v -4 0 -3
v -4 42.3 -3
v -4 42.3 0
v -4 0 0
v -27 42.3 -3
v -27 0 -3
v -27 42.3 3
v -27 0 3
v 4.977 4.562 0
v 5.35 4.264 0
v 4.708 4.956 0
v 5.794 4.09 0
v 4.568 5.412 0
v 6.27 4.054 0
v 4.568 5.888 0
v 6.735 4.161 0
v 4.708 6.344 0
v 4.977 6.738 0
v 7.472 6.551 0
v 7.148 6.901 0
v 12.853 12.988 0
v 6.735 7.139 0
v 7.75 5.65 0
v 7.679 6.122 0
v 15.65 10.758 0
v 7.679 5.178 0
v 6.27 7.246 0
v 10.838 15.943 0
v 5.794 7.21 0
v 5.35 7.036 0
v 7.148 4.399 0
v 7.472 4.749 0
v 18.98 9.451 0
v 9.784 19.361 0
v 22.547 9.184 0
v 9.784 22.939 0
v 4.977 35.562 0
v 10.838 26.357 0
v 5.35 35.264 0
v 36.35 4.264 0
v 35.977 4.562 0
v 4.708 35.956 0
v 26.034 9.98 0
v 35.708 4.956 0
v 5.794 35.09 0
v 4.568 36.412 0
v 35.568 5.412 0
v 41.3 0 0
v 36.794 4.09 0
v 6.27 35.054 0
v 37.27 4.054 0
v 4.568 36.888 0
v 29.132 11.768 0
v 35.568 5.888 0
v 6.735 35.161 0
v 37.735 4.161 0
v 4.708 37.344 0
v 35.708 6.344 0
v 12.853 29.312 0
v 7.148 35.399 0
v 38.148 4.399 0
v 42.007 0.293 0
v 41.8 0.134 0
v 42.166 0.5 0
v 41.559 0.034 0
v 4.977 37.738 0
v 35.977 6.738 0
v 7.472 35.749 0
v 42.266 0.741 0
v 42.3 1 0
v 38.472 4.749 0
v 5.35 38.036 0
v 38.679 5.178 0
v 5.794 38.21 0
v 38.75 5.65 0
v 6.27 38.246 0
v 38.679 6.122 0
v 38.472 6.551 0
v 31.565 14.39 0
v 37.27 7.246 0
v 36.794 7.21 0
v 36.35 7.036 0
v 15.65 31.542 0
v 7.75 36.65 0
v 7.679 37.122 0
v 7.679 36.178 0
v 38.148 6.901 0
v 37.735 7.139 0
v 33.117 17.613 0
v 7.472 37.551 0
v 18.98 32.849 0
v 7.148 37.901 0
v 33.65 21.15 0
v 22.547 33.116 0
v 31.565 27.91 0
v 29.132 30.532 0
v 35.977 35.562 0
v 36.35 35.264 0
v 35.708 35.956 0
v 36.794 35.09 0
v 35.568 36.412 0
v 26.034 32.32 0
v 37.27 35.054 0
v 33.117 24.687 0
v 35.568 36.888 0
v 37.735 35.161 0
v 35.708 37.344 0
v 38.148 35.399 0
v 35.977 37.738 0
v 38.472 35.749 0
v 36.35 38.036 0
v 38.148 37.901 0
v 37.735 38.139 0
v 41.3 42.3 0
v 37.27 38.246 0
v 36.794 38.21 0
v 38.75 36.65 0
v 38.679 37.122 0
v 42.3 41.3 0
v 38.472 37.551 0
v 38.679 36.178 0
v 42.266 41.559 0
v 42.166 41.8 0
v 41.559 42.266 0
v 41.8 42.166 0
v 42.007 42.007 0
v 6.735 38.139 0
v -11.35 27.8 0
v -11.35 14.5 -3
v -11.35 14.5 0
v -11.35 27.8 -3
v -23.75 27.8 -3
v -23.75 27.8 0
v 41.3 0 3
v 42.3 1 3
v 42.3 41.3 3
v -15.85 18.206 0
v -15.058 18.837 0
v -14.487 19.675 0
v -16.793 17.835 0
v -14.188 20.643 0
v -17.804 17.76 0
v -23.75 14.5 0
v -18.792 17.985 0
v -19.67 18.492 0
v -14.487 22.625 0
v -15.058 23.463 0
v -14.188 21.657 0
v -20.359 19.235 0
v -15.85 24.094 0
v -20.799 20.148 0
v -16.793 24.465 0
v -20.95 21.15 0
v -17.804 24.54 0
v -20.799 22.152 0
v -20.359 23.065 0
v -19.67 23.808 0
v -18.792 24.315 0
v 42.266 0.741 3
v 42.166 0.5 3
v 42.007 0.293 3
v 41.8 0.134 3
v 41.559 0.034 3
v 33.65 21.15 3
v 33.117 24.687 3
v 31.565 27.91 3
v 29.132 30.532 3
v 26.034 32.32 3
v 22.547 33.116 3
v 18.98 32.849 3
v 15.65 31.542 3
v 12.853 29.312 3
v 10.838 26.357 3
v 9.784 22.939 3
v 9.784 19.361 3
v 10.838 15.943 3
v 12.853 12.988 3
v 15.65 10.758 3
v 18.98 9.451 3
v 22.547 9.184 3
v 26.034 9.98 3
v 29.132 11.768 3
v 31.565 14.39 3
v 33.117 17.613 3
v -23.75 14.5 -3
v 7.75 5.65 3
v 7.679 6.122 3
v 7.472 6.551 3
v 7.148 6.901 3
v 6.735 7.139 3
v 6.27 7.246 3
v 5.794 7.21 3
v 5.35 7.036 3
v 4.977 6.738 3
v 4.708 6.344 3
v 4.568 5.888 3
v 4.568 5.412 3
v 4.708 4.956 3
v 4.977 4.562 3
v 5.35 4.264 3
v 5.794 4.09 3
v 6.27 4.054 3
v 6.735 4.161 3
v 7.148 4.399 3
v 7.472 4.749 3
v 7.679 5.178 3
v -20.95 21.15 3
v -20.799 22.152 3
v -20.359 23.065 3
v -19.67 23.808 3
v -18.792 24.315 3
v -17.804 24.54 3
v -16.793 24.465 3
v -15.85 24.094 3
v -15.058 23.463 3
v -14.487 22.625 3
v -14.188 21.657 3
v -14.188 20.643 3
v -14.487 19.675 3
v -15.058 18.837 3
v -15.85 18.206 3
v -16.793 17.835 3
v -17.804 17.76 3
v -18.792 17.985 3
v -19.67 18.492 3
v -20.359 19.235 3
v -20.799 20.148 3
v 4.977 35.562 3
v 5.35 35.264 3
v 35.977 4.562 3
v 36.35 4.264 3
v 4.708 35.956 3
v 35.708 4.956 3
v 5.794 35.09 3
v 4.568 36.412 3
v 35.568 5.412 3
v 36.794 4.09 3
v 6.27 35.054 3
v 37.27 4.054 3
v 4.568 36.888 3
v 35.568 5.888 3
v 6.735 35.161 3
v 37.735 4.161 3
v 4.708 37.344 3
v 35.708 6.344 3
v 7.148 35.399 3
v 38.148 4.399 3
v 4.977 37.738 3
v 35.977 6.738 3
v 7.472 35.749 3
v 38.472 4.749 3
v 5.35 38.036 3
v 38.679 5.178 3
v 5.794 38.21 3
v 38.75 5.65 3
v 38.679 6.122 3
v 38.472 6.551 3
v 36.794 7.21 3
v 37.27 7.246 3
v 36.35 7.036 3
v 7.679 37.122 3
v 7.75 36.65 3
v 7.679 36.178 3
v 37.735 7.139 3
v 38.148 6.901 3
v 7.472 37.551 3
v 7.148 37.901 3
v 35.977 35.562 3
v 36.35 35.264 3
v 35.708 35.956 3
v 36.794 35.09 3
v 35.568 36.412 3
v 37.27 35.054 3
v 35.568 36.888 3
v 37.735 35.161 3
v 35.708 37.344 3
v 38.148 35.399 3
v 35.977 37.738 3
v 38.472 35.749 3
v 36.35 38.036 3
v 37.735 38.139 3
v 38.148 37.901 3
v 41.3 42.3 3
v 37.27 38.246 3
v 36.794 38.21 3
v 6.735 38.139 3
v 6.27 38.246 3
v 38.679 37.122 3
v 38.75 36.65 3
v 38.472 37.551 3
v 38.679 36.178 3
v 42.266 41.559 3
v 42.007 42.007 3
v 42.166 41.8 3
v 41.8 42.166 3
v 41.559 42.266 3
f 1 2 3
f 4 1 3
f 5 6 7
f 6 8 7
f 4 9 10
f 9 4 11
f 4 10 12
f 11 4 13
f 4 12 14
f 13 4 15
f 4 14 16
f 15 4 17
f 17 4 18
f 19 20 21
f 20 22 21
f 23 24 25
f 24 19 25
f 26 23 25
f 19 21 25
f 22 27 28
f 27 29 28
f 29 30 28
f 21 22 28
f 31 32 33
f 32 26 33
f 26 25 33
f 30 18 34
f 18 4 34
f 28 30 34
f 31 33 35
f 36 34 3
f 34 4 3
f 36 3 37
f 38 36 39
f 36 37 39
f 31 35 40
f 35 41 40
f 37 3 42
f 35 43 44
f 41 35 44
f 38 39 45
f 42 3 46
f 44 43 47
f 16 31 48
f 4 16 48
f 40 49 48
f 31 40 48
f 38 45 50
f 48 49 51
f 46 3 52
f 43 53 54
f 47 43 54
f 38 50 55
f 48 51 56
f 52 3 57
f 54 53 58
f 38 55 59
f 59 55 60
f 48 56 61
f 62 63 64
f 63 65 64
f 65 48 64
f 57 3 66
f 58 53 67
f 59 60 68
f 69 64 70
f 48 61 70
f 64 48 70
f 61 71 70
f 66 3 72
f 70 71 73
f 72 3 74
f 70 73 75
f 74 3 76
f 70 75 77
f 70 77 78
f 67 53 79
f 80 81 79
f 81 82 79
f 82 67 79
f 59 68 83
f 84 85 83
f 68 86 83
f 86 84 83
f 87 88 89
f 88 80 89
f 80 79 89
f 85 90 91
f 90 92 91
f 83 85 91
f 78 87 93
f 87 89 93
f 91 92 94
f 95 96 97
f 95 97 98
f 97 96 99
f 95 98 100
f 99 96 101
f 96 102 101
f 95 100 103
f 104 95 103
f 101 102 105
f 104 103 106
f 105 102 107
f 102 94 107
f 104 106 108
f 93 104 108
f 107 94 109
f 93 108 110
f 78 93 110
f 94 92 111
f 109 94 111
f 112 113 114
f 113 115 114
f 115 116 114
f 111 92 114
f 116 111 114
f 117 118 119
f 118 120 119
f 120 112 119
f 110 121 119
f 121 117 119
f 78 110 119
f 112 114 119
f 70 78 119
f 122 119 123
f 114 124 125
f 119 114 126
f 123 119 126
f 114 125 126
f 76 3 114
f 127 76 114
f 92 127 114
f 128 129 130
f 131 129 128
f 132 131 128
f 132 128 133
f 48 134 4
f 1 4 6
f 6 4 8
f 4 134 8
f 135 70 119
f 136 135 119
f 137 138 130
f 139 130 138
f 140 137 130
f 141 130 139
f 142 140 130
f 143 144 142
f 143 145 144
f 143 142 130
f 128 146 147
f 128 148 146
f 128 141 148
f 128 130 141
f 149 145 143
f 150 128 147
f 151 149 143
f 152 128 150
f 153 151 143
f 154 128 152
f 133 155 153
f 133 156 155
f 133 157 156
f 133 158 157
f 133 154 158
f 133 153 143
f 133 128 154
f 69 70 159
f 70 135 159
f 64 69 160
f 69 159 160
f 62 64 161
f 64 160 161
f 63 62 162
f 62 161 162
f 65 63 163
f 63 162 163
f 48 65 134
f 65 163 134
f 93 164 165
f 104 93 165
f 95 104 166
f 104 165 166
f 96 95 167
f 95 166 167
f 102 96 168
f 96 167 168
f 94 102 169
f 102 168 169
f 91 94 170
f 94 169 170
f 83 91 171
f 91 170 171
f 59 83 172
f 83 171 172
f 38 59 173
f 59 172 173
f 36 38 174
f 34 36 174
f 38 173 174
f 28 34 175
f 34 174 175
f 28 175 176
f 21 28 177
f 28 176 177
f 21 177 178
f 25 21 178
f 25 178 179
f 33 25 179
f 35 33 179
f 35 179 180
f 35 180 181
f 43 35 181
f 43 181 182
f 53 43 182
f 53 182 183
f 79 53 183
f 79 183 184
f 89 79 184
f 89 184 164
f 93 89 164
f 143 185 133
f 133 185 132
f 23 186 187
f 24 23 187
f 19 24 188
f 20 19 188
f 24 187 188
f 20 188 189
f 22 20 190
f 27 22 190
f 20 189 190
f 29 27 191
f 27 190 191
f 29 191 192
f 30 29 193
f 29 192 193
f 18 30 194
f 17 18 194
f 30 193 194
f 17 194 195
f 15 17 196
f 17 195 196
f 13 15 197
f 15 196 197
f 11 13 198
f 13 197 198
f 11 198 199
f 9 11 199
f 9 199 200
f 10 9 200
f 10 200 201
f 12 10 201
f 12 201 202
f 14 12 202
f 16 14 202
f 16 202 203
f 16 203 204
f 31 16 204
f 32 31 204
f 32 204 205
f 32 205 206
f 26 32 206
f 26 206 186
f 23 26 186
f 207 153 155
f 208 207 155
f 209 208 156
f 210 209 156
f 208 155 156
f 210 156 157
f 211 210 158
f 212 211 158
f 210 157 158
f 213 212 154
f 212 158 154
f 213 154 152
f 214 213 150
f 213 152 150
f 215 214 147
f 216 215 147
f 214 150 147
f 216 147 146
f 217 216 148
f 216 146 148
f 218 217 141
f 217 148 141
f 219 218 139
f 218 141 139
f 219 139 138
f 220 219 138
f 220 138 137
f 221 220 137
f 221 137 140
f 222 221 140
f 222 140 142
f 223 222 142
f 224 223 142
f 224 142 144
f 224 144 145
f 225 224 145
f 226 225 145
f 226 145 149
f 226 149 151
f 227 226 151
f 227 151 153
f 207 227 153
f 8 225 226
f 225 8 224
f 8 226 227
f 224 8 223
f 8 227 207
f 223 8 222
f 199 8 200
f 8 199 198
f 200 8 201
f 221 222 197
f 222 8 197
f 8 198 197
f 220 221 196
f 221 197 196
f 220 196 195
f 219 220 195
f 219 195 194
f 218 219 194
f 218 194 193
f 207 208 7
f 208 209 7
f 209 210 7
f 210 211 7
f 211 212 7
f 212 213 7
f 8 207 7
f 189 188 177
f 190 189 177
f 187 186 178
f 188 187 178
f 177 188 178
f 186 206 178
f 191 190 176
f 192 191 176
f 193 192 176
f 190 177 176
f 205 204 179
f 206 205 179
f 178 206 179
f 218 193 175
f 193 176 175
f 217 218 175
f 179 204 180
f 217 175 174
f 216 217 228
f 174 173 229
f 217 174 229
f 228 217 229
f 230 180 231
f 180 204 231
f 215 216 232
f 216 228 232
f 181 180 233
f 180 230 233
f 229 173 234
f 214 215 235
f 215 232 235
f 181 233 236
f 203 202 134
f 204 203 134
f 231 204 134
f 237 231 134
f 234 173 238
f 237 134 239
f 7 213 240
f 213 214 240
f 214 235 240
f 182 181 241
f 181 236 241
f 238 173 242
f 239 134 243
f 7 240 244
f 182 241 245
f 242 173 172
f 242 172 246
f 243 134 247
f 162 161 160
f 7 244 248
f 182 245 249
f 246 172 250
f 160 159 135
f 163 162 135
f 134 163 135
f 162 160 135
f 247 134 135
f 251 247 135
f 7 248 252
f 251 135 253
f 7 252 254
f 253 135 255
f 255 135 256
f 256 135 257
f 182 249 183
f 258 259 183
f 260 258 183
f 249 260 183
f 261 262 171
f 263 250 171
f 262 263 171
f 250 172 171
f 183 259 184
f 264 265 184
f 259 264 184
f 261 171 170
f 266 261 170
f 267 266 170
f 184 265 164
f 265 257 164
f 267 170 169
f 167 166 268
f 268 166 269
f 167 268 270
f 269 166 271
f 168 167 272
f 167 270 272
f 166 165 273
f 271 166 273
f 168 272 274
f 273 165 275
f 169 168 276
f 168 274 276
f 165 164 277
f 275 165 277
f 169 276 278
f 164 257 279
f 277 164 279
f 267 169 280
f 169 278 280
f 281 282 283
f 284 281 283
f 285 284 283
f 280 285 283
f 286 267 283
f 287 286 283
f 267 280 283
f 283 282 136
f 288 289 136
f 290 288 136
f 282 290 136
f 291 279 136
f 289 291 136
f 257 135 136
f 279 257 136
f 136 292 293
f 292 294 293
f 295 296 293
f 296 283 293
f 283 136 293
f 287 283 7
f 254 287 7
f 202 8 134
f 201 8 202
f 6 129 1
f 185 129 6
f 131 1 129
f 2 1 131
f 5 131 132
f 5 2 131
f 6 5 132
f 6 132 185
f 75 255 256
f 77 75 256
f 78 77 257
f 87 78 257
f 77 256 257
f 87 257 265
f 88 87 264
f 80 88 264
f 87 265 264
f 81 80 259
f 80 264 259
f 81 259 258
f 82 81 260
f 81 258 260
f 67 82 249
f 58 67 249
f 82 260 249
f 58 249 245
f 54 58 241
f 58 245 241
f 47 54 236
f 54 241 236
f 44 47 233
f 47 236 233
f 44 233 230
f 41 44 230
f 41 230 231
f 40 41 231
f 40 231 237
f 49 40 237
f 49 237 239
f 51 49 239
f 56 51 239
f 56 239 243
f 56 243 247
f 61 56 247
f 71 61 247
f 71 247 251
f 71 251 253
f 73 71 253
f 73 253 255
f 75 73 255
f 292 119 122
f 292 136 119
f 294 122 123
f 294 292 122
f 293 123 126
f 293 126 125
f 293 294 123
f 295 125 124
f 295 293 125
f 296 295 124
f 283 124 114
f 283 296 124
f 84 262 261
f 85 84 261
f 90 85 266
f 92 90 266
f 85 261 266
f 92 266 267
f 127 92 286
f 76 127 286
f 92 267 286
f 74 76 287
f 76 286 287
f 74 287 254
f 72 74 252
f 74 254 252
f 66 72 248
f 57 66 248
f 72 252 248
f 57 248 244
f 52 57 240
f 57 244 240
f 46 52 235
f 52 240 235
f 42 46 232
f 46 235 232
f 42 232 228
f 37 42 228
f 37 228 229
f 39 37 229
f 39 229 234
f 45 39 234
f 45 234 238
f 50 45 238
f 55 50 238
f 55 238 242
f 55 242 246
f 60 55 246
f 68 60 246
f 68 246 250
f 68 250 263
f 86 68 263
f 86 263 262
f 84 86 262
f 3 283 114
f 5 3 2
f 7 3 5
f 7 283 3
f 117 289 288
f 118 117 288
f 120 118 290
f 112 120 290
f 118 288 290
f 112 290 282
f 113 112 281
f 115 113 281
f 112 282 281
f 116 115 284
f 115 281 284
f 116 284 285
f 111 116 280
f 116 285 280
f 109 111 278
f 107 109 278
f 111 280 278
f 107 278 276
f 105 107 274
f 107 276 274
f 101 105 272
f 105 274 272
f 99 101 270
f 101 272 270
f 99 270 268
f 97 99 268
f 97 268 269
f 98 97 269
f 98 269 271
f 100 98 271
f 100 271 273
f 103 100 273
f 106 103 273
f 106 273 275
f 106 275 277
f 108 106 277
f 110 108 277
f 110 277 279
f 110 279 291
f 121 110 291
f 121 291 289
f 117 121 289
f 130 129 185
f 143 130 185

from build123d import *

# Parameters (mm, degrees)
BOSS_EXTRUDE4_DEPTH = 3
SKETCH10_W          = 6
SKETCH10_H          = 42.3
BOSS_EXTRUDE5_DEPTH = 3
SKETCH11_R          = 12
SKETCH11_R_2        = 1.6
CUT_EXTRUDE1_DEPTH  = 7
SKETCH15_W          = 3
SKETCH15_H          = 42.3
BOSS_EXTRUDE8_DEPTH = 20
FILLET5_R           = 1
SKETCH16_R          = 3.4
CUT_EXTRUDE5_DEPTH  = 4
SKETCH23_W          = 20
SKETCH23_H          = 42.3
BOSS_EXTRUDE9_DEPTH = 3
SKETCH26_W          = 12.4
SKETCH26_H          = 13.3
CUT_EXTRUDE7_DEPTH  = 3


with BuildPart() as part:
    # Sketch3 → Boss-Extrude4 (new body)
    with BuildSketch(Plane.XY):
        Polygon((0, 0), (42.3, 0), (42.3, 42.3), (0, 42.3), (-4, 42.3), (-4, 0), align=None)
    extrude(amount=BOSS_EXTRUDE4_DEPTH)

    # Sketch10 → Boss-Extrude5 (add)
    with BuildSketch(Plane.ZY.offset(4)):
        with Locations((0, 21.15)):
            Rectangle(SKETCH10_W, SKETCH10_H)
    extrude(amount=BOSS_EXTRUDE5_DEPTH)

    # Sketch11 → Cut-Extrude1 (cut, through all)
    with BuildSketch(Plane.XY.offset(3)):
        with Locations((21.65, 21.15)):
            Circle(SKETCH11_R)
        with Locations((6.15, 36.65)):
            Circle(SKETCH11_R_2)
        with Locations((37.15, 36.65)):
            Circle(SKETCH11_R_2)
        with Locations((37.15, 5.65)):
            Circle(SKETCH11_R_2)
        with Locations((6.15, 5.65)):
            Circle(SKETCH11_R_2)
    extrude(amount=-CUT_EXTRUDE1_DEPTH, mode=Mode.SUBTRACT)

    # Sketch15 → Boss-Extrude8 (add)
    with BuildSketch(Plane.ZY.offset(7)):
        with Locations((1.5, 21.15)):
            Rectangle(SKETCH15_W, SKETCH15_H)
    extrude(amount=BOSS_EXTRUDE8_DEPTH)

    # Fillet5
    fillet5_edges = [part.edges().sort_by_distance(p)[0] for p in [
        (42.3, 0, 1.5),
        (42.3, 42.3, 1.5),
    ]]
    fillet(fillet5_edges, radius=FILLET5_R)

    # Sketch16 → Cut-Extrude5 (cut, through all)
    with BuildSketch(Plane(origin=(0, 0, 0), x_dir=(-1, 0, 0), z_dir=(0, 0, -1))):
        with Locations((17.55, 21.15)):
            Circle(SKETCH16_R)
    extrude(amount=-CUT_EXTRUDE5_DEPTH, mode=Mode.SUBTRACT)

    # Sketch23 → Boss-Extrude9 (add)
    with BuildSketch(Plane(origin=(0, 0, 0), x_dir=(-1, 0, 0), z_dir=(0, 0, -1))):
        with Locations((17, 21.15)):
            Rectangle(SKETCH23_W, SKETCH23_H)
    extrude(amount=BOSS_EXTRUDE9_DEPTH)

    # Sketch26 → Cut-Extrude7 (cut)
    with BuildSketch(Plane(origin=(0, 0, -3), x_dir=(-1, 0, 0), z_dir=(0, 0, -1))):
        with Locations((17.55, 21.15)):
            Rectangle(SKETCH26_W, SKETCH26_H)
    extrude(amount=-CUT_EXTRUDE7_DEPTH, mode=Mode.SUBTRACT)


solid = part.part
